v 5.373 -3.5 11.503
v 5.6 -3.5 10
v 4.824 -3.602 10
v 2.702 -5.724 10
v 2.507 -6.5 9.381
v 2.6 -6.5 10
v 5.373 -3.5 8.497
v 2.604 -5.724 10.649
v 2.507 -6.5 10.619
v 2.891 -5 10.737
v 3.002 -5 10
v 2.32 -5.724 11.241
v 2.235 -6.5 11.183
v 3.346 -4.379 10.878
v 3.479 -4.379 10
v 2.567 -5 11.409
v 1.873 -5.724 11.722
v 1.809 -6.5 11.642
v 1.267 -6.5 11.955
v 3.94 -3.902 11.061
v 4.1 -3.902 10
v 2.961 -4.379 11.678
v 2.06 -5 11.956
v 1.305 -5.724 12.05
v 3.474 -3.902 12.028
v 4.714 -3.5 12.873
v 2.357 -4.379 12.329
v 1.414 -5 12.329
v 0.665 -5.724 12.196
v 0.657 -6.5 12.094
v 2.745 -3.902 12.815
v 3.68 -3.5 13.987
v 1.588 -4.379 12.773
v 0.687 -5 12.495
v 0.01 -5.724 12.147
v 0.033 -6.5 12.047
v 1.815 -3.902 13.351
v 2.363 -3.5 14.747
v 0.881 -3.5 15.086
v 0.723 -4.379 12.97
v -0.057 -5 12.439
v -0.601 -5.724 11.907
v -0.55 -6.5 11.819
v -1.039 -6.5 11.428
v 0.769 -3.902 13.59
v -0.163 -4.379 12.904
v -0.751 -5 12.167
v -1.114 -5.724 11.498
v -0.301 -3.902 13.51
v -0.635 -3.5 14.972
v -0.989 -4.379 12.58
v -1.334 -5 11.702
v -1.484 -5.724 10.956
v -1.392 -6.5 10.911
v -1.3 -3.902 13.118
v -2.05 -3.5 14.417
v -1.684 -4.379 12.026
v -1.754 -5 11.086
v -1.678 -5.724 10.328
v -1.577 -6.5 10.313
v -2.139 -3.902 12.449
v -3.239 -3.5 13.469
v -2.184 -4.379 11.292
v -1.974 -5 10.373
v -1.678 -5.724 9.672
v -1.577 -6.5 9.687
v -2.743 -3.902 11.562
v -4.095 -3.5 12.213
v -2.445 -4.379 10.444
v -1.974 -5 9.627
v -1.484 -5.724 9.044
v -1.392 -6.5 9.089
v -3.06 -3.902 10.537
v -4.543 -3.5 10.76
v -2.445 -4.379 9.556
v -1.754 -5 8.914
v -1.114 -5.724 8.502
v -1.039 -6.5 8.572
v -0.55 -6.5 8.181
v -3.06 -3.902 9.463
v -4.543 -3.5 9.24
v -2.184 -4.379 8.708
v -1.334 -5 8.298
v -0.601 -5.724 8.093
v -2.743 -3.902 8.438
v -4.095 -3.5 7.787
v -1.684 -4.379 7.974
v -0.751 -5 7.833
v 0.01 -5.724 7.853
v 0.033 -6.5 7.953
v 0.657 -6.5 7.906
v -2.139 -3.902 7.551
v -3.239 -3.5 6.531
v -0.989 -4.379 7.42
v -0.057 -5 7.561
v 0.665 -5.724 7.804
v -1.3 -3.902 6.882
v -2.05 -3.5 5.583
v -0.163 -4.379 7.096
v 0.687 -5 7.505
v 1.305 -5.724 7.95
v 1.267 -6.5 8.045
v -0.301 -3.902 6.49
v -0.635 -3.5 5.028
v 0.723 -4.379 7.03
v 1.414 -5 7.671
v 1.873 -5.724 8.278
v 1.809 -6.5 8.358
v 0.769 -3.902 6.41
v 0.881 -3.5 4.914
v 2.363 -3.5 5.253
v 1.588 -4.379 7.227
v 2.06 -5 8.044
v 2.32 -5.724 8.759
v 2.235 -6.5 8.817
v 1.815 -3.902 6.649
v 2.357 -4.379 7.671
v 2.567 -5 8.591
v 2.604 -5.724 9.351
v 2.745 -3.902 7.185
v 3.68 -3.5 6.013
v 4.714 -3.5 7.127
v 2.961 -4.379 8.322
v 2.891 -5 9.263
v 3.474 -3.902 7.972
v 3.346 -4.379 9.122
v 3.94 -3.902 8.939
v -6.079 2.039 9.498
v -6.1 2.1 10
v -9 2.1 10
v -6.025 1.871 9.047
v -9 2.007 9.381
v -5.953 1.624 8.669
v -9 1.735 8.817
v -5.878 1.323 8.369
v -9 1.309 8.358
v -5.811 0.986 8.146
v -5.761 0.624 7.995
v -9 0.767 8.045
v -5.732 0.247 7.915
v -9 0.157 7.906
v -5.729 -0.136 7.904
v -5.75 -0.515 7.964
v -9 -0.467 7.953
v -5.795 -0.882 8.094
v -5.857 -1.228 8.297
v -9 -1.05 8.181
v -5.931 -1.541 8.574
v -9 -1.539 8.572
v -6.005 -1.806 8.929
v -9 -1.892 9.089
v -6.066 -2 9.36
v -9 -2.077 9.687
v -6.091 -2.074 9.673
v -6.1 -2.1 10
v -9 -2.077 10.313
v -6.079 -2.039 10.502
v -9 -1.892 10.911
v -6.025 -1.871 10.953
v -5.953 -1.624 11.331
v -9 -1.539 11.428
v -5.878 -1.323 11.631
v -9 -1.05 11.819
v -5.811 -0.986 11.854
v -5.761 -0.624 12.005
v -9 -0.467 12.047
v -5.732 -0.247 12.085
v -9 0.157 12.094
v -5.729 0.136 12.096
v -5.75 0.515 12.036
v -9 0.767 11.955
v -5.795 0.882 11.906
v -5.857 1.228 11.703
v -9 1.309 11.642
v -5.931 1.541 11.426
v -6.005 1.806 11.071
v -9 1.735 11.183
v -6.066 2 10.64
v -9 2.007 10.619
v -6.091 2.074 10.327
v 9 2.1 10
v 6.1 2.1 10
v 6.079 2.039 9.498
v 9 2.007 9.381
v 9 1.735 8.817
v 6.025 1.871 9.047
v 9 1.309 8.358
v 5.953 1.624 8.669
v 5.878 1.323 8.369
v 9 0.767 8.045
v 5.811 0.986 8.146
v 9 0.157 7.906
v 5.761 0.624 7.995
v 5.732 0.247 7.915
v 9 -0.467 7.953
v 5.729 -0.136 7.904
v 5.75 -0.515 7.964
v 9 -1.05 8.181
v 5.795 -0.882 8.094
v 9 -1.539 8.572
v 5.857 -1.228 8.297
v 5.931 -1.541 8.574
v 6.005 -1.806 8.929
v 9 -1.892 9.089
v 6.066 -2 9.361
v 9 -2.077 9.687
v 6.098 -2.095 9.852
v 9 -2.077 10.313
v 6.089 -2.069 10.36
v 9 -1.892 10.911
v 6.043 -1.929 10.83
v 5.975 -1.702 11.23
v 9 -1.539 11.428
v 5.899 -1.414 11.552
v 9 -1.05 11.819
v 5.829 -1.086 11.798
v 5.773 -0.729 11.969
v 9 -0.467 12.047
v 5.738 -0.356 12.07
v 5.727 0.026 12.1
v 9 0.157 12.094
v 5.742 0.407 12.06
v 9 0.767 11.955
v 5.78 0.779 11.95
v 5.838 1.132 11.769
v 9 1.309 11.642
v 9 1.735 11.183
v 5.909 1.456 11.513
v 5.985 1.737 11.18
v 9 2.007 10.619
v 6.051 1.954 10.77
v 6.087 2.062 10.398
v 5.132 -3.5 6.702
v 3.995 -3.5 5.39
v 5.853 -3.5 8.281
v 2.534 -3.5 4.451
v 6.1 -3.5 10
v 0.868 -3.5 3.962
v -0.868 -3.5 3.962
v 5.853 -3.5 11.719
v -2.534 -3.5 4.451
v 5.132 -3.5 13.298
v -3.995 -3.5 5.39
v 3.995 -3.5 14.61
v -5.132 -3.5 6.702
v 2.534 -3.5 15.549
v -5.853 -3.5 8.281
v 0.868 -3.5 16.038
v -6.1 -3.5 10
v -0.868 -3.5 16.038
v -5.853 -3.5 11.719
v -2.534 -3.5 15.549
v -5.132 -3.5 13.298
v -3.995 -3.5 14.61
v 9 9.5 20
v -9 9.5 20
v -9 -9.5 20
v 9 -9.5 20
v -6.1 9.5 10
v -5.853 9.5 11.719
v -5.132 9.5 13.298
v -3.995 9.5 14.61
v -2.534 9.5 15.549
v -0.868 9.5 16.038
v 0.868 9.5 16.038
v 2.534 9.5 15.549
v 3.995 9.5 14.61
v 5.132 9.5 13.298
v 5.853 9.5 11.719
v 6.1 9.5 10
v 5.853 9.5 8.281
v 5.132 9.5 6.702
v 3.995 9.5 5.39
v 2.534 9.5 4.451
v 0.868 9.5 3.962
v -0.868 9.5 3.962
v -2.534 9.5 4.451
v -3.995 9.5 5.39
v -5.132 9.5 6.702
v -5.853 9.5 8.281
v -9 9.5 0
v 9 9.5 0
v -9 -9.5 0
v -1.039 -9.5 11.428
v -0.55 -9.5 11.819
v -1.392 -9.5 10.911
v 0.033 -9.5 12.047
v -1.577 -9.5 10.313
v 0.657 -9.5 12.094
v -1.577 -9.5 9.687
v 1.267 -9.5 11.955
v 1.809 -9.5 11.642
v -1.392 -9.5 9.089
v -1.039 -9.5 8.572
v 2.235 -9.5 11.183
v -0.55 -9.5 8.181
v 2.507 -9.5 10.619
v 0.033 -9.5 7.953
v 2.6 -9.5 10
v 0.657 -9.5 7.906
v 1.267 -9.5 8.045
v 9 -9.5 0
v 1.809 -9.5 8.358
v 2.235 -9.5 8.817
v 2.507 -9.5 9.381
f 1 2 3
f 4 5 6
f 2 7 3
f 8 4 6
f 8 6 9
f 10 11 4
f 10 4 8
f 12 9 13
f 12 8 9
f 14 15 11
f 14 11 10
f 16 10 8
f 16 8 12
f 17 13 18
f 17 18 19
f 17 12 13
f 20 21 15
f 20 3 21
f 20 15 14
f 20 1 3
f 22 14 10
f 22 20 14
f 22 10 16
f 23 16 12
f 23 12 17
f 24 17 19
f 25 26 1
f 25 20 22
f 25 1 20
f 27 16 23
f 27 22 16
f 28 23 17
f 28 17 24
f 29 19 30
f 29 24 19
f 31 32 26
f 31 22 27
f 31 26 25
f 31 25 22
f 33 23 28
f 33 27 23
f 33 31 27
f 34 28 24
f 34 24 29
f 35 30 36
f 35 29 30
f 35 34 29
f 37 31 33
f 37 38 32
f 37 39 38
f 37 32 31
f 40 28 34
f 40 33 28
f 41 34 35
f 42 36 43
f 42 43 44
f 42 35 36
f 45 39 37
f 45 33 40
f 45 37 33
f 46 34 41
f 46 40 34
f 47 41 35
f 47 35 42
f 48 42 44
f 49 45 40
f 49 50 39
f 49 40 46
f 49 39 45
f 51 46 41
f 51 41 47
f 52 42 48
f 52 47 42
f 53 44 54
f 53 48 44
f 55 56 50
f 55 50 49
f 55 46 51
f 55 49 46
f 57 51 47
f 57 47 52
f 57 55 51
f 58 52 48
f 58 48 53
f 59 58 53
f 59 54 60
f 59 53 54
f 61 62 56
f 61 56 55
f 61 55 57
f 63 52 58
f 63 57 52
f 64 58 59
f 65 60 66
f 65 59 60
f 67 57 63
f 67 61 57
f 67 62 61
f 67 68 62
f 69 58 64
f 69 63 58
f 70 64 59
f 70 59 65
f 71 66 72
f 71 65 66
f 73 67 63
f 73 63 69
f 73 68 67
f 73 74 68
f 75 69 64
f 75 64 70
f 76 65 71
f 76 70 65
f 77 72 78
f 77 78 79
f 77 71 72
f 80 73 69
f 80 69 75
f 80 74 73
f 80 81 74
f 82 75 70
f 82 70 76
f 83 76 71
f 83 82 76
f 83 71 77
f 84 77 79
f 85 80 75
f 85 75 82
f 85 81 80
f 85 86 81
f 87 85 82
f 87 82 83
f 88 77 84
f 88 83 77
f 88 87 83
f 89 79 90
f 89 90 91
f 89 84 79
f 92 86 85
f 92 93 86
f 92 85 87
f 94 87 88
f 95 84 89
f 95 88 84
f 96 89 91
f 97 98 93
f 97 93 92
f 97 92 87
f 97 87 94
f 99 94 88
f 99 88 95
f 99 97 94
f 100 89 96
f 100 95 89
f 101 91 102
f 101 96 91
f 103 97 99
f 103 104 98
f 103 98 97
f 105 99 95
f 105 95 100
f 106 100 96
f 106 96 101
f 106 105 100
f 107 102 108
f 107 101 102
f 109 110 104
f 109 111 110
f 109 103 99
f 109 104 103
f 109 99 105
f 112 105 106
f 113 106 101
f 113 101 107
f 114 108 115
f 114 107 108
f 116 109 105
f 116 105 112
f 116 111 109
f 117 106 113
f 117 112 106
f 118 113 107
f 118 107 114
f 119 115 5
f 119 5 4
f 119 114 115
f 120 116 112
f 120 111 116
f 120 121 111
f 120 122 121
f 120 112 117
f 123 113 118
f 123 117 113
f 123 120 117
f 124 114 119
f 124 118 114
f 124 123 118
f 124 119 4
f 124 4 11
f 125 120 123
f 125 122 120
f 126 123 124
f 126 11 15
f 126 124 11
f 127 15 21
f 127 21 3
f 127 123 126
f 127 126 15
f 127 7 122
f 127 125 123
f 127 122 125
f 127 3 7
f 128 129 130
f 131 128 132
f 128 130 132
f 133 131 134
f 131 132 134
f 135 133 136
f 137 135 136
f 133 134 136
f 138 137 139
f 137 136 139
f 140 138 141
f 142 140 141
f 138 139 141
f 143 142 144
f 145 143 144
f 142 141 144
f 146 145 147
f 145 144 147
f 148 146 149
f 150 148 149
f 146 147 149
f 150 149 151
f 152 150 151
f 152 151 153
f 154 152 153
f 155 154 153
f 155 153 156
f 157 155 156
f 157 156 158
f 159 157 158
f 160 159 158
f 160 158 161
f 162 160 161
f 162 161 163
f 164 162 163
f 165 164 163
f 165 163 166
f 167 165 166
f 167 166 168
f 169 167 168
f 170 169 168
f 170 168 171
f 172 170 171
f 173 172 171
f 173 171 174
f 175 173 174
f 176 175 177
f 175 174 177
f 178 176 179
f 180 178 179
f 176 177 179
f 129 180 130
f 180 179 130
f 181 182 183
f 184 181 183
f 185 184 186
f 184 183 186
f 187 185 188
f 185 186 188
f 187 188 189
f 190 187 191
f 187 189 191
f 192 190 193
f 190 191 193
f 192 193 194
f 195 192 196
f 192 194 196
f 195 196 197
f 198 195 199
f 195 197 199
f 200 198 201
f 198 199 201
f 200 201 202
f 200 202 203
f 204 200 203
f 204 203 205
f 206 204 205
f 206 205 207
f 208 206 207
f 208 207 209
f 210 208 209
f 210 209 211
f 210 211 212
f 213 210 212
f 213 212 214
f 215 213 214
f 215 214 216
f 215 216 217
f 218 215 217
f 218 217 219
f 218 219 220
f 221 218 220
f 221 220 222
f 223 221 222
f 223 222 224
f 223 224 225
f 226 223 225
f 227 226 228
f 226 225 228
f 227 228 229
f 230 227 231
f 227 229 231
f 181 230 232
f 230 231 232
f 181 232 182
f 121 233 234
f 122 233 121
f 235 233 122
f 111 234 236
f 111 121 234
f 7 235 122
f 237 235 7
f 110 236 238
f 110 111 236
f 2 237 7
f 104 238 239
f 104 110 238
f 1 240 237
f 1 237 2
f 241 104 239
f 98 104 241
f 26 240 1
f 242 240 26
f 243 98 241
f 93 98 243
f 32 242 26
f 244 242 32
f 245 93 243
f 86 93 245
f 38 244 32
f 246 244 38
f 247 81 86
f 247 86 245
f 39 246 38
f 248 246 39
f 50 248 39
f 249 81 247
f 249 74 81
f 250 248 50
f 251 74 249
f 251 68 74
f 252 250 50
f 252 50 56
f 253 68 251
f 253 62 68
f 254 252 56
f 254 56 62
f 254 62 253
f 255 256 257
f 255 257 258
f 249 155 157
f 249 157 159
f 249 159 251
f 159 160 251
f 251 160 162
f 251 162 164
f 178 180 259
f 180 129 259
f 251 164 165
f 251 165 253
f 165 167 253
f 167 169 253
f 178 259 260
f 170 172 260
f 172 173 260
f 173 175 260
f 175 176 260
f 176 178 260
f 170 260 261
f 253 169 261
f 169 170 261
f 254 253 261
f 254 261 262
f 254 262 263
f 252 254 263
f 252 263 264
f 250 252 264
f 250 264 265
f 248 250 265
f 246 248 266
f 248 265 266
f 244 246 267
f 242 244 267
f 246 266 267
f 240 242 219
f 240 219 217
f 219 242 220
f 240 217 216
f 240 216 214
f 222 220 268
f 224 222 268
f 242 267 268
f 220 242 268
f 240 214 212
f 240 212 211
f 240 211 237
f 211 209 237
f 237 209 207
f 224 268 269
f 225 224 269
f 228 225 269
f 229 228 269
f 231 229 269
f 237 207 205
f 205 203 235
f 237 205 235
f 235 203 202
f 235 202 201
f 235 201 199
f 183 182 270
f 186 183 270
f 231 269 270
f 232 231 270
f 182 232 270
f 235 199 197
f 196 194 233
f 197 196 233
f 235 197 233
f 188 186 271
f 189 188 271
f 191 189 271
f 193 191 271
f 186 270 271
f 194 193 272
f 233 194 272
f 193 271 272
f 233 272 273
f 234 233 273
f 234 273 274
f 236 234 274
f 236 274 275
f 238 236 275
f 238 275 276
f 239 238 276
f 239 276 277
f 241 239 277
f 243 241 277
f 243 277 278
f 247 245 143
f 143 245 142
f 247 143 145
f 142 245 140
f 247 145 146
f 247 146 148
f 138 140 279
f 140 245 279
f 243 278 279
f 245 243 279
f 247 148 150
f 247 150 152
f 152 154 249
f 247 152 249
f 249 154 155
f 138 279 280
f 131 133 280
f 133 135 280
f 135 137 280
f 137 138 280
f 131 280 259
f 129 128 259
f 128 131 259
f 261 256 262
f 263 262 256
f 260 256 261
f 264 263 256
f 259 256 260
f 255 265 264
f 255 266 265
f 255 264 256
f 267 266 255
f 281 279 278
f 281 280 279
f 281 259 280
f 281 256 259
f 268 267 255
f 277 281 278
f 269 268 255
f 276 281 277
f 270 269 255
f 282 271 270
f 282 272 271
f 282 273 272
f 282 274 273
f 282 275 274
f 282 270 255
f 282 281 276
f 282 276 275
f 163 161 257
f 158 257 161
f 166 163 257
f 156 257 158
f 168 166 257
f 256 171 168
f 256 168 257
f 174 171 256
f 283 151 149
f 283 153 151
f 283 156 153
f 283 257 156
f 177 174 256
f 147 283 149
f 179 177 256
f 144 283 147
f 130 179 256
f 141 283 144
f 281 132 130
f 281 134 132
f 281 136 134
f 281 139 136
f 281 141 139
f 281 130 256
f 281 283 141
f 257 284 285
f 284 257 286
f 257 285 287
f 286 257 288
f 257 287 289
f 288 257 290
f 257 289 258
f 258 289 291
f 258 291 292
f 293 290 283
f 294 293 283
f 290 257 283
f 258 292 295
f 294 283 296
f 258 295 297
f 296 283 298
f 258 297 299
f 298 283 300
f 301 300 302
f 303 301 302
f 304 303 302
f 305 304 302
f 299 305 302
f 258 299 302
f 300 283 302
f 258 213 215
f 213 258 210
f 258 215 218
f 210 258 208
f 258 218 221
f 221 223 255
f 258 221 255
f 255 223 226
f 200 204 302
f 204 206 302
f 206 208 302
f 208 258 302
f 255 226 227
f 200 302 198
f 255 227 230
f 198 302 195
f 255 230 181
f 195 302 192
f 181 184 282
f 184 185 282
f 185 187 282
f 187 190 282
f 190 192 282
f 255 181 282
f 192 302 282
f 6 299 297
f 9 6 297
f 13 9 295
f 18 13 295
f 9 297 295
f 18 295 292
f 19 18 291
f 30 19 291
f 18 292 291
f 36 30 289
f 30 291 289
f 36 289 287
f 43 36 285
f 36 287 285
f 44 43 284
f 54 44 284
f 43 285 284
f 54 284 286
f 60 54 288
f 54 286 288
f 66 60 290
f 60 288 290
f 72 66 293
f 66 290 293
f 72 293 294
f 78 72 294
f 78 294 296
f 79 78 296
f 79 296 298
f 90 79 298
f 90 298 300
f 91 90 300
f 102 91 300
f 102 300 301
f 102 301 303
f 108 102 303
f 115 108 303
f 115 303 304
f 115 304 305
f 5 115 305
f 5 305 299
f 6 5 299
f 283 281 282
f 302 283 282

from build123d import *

# Parameters (mm, degrees)
F0_W     = 18
F0_H     = 19
F1_DEPTH = 20
F3_R     = 6.1
F4_DEPTH = 13
F2_R     = 2.1
F5_DEPTH = 18
F6_R     = 3
F8_DEPTH = 25


with BuildPart() as f1:
    # F0 (on Top) → F1 (new body)
    with BuildSketch(Plane.XY):
        Rectangle(F0_W, F0_H)
    extrude(amount=F1_DEPTH)

    # F3 (on face) → F4 (cut)
    with BuildSketch(Plane(origin=(0, 9.5, 0), x_dir=(-1, 0, 0), z_dir=(0, 1, 0))):
        with Locations((0, 10)):
            Circle(F3_R)
    extrude(amount=-F4_DEPTH, mode=Mode.SUBTRACT)

    # F2 (on face) → F5 (cut)
    with BuildSketch(Plane.XZ.offset(9.5)):
        with Locations((0.5, 10)):
            Circle(F2_R)
    extrude(amount=-F5_DEPTH, mode=Mode.SUBTRACT)

    # F6
    f6_edges = [f1.edges().sort_by_distance(p)[0] for p in [
        (-1.6, -3.5, 10),
    ]]
    fillet(f6_edges, radius=F6_R)

    # F7 (on face) → F8 (cut)
    with BuildSketch(Plane(origin=(-9, 0, 0), x_dir=(0, -1, 0), z_dir=(-1, 0, 0))):
        with BuildLine():
            Line((-2.1, 10), (2.1, 10))
            ThreePointArc((2.1, 10), (0, 12.1), (-2.1, 10))
        make_face()
        with BuildLine():
            ThreePointArc((-2.1, 10), (0, 7.9), (2.1, 10))
            Line((2.1, 10), (-2.1, 10))
        make_face()
    extrude(amount=-F8_DEPTH, mode=Mode.SUBTRACT)


solid = f1.part
